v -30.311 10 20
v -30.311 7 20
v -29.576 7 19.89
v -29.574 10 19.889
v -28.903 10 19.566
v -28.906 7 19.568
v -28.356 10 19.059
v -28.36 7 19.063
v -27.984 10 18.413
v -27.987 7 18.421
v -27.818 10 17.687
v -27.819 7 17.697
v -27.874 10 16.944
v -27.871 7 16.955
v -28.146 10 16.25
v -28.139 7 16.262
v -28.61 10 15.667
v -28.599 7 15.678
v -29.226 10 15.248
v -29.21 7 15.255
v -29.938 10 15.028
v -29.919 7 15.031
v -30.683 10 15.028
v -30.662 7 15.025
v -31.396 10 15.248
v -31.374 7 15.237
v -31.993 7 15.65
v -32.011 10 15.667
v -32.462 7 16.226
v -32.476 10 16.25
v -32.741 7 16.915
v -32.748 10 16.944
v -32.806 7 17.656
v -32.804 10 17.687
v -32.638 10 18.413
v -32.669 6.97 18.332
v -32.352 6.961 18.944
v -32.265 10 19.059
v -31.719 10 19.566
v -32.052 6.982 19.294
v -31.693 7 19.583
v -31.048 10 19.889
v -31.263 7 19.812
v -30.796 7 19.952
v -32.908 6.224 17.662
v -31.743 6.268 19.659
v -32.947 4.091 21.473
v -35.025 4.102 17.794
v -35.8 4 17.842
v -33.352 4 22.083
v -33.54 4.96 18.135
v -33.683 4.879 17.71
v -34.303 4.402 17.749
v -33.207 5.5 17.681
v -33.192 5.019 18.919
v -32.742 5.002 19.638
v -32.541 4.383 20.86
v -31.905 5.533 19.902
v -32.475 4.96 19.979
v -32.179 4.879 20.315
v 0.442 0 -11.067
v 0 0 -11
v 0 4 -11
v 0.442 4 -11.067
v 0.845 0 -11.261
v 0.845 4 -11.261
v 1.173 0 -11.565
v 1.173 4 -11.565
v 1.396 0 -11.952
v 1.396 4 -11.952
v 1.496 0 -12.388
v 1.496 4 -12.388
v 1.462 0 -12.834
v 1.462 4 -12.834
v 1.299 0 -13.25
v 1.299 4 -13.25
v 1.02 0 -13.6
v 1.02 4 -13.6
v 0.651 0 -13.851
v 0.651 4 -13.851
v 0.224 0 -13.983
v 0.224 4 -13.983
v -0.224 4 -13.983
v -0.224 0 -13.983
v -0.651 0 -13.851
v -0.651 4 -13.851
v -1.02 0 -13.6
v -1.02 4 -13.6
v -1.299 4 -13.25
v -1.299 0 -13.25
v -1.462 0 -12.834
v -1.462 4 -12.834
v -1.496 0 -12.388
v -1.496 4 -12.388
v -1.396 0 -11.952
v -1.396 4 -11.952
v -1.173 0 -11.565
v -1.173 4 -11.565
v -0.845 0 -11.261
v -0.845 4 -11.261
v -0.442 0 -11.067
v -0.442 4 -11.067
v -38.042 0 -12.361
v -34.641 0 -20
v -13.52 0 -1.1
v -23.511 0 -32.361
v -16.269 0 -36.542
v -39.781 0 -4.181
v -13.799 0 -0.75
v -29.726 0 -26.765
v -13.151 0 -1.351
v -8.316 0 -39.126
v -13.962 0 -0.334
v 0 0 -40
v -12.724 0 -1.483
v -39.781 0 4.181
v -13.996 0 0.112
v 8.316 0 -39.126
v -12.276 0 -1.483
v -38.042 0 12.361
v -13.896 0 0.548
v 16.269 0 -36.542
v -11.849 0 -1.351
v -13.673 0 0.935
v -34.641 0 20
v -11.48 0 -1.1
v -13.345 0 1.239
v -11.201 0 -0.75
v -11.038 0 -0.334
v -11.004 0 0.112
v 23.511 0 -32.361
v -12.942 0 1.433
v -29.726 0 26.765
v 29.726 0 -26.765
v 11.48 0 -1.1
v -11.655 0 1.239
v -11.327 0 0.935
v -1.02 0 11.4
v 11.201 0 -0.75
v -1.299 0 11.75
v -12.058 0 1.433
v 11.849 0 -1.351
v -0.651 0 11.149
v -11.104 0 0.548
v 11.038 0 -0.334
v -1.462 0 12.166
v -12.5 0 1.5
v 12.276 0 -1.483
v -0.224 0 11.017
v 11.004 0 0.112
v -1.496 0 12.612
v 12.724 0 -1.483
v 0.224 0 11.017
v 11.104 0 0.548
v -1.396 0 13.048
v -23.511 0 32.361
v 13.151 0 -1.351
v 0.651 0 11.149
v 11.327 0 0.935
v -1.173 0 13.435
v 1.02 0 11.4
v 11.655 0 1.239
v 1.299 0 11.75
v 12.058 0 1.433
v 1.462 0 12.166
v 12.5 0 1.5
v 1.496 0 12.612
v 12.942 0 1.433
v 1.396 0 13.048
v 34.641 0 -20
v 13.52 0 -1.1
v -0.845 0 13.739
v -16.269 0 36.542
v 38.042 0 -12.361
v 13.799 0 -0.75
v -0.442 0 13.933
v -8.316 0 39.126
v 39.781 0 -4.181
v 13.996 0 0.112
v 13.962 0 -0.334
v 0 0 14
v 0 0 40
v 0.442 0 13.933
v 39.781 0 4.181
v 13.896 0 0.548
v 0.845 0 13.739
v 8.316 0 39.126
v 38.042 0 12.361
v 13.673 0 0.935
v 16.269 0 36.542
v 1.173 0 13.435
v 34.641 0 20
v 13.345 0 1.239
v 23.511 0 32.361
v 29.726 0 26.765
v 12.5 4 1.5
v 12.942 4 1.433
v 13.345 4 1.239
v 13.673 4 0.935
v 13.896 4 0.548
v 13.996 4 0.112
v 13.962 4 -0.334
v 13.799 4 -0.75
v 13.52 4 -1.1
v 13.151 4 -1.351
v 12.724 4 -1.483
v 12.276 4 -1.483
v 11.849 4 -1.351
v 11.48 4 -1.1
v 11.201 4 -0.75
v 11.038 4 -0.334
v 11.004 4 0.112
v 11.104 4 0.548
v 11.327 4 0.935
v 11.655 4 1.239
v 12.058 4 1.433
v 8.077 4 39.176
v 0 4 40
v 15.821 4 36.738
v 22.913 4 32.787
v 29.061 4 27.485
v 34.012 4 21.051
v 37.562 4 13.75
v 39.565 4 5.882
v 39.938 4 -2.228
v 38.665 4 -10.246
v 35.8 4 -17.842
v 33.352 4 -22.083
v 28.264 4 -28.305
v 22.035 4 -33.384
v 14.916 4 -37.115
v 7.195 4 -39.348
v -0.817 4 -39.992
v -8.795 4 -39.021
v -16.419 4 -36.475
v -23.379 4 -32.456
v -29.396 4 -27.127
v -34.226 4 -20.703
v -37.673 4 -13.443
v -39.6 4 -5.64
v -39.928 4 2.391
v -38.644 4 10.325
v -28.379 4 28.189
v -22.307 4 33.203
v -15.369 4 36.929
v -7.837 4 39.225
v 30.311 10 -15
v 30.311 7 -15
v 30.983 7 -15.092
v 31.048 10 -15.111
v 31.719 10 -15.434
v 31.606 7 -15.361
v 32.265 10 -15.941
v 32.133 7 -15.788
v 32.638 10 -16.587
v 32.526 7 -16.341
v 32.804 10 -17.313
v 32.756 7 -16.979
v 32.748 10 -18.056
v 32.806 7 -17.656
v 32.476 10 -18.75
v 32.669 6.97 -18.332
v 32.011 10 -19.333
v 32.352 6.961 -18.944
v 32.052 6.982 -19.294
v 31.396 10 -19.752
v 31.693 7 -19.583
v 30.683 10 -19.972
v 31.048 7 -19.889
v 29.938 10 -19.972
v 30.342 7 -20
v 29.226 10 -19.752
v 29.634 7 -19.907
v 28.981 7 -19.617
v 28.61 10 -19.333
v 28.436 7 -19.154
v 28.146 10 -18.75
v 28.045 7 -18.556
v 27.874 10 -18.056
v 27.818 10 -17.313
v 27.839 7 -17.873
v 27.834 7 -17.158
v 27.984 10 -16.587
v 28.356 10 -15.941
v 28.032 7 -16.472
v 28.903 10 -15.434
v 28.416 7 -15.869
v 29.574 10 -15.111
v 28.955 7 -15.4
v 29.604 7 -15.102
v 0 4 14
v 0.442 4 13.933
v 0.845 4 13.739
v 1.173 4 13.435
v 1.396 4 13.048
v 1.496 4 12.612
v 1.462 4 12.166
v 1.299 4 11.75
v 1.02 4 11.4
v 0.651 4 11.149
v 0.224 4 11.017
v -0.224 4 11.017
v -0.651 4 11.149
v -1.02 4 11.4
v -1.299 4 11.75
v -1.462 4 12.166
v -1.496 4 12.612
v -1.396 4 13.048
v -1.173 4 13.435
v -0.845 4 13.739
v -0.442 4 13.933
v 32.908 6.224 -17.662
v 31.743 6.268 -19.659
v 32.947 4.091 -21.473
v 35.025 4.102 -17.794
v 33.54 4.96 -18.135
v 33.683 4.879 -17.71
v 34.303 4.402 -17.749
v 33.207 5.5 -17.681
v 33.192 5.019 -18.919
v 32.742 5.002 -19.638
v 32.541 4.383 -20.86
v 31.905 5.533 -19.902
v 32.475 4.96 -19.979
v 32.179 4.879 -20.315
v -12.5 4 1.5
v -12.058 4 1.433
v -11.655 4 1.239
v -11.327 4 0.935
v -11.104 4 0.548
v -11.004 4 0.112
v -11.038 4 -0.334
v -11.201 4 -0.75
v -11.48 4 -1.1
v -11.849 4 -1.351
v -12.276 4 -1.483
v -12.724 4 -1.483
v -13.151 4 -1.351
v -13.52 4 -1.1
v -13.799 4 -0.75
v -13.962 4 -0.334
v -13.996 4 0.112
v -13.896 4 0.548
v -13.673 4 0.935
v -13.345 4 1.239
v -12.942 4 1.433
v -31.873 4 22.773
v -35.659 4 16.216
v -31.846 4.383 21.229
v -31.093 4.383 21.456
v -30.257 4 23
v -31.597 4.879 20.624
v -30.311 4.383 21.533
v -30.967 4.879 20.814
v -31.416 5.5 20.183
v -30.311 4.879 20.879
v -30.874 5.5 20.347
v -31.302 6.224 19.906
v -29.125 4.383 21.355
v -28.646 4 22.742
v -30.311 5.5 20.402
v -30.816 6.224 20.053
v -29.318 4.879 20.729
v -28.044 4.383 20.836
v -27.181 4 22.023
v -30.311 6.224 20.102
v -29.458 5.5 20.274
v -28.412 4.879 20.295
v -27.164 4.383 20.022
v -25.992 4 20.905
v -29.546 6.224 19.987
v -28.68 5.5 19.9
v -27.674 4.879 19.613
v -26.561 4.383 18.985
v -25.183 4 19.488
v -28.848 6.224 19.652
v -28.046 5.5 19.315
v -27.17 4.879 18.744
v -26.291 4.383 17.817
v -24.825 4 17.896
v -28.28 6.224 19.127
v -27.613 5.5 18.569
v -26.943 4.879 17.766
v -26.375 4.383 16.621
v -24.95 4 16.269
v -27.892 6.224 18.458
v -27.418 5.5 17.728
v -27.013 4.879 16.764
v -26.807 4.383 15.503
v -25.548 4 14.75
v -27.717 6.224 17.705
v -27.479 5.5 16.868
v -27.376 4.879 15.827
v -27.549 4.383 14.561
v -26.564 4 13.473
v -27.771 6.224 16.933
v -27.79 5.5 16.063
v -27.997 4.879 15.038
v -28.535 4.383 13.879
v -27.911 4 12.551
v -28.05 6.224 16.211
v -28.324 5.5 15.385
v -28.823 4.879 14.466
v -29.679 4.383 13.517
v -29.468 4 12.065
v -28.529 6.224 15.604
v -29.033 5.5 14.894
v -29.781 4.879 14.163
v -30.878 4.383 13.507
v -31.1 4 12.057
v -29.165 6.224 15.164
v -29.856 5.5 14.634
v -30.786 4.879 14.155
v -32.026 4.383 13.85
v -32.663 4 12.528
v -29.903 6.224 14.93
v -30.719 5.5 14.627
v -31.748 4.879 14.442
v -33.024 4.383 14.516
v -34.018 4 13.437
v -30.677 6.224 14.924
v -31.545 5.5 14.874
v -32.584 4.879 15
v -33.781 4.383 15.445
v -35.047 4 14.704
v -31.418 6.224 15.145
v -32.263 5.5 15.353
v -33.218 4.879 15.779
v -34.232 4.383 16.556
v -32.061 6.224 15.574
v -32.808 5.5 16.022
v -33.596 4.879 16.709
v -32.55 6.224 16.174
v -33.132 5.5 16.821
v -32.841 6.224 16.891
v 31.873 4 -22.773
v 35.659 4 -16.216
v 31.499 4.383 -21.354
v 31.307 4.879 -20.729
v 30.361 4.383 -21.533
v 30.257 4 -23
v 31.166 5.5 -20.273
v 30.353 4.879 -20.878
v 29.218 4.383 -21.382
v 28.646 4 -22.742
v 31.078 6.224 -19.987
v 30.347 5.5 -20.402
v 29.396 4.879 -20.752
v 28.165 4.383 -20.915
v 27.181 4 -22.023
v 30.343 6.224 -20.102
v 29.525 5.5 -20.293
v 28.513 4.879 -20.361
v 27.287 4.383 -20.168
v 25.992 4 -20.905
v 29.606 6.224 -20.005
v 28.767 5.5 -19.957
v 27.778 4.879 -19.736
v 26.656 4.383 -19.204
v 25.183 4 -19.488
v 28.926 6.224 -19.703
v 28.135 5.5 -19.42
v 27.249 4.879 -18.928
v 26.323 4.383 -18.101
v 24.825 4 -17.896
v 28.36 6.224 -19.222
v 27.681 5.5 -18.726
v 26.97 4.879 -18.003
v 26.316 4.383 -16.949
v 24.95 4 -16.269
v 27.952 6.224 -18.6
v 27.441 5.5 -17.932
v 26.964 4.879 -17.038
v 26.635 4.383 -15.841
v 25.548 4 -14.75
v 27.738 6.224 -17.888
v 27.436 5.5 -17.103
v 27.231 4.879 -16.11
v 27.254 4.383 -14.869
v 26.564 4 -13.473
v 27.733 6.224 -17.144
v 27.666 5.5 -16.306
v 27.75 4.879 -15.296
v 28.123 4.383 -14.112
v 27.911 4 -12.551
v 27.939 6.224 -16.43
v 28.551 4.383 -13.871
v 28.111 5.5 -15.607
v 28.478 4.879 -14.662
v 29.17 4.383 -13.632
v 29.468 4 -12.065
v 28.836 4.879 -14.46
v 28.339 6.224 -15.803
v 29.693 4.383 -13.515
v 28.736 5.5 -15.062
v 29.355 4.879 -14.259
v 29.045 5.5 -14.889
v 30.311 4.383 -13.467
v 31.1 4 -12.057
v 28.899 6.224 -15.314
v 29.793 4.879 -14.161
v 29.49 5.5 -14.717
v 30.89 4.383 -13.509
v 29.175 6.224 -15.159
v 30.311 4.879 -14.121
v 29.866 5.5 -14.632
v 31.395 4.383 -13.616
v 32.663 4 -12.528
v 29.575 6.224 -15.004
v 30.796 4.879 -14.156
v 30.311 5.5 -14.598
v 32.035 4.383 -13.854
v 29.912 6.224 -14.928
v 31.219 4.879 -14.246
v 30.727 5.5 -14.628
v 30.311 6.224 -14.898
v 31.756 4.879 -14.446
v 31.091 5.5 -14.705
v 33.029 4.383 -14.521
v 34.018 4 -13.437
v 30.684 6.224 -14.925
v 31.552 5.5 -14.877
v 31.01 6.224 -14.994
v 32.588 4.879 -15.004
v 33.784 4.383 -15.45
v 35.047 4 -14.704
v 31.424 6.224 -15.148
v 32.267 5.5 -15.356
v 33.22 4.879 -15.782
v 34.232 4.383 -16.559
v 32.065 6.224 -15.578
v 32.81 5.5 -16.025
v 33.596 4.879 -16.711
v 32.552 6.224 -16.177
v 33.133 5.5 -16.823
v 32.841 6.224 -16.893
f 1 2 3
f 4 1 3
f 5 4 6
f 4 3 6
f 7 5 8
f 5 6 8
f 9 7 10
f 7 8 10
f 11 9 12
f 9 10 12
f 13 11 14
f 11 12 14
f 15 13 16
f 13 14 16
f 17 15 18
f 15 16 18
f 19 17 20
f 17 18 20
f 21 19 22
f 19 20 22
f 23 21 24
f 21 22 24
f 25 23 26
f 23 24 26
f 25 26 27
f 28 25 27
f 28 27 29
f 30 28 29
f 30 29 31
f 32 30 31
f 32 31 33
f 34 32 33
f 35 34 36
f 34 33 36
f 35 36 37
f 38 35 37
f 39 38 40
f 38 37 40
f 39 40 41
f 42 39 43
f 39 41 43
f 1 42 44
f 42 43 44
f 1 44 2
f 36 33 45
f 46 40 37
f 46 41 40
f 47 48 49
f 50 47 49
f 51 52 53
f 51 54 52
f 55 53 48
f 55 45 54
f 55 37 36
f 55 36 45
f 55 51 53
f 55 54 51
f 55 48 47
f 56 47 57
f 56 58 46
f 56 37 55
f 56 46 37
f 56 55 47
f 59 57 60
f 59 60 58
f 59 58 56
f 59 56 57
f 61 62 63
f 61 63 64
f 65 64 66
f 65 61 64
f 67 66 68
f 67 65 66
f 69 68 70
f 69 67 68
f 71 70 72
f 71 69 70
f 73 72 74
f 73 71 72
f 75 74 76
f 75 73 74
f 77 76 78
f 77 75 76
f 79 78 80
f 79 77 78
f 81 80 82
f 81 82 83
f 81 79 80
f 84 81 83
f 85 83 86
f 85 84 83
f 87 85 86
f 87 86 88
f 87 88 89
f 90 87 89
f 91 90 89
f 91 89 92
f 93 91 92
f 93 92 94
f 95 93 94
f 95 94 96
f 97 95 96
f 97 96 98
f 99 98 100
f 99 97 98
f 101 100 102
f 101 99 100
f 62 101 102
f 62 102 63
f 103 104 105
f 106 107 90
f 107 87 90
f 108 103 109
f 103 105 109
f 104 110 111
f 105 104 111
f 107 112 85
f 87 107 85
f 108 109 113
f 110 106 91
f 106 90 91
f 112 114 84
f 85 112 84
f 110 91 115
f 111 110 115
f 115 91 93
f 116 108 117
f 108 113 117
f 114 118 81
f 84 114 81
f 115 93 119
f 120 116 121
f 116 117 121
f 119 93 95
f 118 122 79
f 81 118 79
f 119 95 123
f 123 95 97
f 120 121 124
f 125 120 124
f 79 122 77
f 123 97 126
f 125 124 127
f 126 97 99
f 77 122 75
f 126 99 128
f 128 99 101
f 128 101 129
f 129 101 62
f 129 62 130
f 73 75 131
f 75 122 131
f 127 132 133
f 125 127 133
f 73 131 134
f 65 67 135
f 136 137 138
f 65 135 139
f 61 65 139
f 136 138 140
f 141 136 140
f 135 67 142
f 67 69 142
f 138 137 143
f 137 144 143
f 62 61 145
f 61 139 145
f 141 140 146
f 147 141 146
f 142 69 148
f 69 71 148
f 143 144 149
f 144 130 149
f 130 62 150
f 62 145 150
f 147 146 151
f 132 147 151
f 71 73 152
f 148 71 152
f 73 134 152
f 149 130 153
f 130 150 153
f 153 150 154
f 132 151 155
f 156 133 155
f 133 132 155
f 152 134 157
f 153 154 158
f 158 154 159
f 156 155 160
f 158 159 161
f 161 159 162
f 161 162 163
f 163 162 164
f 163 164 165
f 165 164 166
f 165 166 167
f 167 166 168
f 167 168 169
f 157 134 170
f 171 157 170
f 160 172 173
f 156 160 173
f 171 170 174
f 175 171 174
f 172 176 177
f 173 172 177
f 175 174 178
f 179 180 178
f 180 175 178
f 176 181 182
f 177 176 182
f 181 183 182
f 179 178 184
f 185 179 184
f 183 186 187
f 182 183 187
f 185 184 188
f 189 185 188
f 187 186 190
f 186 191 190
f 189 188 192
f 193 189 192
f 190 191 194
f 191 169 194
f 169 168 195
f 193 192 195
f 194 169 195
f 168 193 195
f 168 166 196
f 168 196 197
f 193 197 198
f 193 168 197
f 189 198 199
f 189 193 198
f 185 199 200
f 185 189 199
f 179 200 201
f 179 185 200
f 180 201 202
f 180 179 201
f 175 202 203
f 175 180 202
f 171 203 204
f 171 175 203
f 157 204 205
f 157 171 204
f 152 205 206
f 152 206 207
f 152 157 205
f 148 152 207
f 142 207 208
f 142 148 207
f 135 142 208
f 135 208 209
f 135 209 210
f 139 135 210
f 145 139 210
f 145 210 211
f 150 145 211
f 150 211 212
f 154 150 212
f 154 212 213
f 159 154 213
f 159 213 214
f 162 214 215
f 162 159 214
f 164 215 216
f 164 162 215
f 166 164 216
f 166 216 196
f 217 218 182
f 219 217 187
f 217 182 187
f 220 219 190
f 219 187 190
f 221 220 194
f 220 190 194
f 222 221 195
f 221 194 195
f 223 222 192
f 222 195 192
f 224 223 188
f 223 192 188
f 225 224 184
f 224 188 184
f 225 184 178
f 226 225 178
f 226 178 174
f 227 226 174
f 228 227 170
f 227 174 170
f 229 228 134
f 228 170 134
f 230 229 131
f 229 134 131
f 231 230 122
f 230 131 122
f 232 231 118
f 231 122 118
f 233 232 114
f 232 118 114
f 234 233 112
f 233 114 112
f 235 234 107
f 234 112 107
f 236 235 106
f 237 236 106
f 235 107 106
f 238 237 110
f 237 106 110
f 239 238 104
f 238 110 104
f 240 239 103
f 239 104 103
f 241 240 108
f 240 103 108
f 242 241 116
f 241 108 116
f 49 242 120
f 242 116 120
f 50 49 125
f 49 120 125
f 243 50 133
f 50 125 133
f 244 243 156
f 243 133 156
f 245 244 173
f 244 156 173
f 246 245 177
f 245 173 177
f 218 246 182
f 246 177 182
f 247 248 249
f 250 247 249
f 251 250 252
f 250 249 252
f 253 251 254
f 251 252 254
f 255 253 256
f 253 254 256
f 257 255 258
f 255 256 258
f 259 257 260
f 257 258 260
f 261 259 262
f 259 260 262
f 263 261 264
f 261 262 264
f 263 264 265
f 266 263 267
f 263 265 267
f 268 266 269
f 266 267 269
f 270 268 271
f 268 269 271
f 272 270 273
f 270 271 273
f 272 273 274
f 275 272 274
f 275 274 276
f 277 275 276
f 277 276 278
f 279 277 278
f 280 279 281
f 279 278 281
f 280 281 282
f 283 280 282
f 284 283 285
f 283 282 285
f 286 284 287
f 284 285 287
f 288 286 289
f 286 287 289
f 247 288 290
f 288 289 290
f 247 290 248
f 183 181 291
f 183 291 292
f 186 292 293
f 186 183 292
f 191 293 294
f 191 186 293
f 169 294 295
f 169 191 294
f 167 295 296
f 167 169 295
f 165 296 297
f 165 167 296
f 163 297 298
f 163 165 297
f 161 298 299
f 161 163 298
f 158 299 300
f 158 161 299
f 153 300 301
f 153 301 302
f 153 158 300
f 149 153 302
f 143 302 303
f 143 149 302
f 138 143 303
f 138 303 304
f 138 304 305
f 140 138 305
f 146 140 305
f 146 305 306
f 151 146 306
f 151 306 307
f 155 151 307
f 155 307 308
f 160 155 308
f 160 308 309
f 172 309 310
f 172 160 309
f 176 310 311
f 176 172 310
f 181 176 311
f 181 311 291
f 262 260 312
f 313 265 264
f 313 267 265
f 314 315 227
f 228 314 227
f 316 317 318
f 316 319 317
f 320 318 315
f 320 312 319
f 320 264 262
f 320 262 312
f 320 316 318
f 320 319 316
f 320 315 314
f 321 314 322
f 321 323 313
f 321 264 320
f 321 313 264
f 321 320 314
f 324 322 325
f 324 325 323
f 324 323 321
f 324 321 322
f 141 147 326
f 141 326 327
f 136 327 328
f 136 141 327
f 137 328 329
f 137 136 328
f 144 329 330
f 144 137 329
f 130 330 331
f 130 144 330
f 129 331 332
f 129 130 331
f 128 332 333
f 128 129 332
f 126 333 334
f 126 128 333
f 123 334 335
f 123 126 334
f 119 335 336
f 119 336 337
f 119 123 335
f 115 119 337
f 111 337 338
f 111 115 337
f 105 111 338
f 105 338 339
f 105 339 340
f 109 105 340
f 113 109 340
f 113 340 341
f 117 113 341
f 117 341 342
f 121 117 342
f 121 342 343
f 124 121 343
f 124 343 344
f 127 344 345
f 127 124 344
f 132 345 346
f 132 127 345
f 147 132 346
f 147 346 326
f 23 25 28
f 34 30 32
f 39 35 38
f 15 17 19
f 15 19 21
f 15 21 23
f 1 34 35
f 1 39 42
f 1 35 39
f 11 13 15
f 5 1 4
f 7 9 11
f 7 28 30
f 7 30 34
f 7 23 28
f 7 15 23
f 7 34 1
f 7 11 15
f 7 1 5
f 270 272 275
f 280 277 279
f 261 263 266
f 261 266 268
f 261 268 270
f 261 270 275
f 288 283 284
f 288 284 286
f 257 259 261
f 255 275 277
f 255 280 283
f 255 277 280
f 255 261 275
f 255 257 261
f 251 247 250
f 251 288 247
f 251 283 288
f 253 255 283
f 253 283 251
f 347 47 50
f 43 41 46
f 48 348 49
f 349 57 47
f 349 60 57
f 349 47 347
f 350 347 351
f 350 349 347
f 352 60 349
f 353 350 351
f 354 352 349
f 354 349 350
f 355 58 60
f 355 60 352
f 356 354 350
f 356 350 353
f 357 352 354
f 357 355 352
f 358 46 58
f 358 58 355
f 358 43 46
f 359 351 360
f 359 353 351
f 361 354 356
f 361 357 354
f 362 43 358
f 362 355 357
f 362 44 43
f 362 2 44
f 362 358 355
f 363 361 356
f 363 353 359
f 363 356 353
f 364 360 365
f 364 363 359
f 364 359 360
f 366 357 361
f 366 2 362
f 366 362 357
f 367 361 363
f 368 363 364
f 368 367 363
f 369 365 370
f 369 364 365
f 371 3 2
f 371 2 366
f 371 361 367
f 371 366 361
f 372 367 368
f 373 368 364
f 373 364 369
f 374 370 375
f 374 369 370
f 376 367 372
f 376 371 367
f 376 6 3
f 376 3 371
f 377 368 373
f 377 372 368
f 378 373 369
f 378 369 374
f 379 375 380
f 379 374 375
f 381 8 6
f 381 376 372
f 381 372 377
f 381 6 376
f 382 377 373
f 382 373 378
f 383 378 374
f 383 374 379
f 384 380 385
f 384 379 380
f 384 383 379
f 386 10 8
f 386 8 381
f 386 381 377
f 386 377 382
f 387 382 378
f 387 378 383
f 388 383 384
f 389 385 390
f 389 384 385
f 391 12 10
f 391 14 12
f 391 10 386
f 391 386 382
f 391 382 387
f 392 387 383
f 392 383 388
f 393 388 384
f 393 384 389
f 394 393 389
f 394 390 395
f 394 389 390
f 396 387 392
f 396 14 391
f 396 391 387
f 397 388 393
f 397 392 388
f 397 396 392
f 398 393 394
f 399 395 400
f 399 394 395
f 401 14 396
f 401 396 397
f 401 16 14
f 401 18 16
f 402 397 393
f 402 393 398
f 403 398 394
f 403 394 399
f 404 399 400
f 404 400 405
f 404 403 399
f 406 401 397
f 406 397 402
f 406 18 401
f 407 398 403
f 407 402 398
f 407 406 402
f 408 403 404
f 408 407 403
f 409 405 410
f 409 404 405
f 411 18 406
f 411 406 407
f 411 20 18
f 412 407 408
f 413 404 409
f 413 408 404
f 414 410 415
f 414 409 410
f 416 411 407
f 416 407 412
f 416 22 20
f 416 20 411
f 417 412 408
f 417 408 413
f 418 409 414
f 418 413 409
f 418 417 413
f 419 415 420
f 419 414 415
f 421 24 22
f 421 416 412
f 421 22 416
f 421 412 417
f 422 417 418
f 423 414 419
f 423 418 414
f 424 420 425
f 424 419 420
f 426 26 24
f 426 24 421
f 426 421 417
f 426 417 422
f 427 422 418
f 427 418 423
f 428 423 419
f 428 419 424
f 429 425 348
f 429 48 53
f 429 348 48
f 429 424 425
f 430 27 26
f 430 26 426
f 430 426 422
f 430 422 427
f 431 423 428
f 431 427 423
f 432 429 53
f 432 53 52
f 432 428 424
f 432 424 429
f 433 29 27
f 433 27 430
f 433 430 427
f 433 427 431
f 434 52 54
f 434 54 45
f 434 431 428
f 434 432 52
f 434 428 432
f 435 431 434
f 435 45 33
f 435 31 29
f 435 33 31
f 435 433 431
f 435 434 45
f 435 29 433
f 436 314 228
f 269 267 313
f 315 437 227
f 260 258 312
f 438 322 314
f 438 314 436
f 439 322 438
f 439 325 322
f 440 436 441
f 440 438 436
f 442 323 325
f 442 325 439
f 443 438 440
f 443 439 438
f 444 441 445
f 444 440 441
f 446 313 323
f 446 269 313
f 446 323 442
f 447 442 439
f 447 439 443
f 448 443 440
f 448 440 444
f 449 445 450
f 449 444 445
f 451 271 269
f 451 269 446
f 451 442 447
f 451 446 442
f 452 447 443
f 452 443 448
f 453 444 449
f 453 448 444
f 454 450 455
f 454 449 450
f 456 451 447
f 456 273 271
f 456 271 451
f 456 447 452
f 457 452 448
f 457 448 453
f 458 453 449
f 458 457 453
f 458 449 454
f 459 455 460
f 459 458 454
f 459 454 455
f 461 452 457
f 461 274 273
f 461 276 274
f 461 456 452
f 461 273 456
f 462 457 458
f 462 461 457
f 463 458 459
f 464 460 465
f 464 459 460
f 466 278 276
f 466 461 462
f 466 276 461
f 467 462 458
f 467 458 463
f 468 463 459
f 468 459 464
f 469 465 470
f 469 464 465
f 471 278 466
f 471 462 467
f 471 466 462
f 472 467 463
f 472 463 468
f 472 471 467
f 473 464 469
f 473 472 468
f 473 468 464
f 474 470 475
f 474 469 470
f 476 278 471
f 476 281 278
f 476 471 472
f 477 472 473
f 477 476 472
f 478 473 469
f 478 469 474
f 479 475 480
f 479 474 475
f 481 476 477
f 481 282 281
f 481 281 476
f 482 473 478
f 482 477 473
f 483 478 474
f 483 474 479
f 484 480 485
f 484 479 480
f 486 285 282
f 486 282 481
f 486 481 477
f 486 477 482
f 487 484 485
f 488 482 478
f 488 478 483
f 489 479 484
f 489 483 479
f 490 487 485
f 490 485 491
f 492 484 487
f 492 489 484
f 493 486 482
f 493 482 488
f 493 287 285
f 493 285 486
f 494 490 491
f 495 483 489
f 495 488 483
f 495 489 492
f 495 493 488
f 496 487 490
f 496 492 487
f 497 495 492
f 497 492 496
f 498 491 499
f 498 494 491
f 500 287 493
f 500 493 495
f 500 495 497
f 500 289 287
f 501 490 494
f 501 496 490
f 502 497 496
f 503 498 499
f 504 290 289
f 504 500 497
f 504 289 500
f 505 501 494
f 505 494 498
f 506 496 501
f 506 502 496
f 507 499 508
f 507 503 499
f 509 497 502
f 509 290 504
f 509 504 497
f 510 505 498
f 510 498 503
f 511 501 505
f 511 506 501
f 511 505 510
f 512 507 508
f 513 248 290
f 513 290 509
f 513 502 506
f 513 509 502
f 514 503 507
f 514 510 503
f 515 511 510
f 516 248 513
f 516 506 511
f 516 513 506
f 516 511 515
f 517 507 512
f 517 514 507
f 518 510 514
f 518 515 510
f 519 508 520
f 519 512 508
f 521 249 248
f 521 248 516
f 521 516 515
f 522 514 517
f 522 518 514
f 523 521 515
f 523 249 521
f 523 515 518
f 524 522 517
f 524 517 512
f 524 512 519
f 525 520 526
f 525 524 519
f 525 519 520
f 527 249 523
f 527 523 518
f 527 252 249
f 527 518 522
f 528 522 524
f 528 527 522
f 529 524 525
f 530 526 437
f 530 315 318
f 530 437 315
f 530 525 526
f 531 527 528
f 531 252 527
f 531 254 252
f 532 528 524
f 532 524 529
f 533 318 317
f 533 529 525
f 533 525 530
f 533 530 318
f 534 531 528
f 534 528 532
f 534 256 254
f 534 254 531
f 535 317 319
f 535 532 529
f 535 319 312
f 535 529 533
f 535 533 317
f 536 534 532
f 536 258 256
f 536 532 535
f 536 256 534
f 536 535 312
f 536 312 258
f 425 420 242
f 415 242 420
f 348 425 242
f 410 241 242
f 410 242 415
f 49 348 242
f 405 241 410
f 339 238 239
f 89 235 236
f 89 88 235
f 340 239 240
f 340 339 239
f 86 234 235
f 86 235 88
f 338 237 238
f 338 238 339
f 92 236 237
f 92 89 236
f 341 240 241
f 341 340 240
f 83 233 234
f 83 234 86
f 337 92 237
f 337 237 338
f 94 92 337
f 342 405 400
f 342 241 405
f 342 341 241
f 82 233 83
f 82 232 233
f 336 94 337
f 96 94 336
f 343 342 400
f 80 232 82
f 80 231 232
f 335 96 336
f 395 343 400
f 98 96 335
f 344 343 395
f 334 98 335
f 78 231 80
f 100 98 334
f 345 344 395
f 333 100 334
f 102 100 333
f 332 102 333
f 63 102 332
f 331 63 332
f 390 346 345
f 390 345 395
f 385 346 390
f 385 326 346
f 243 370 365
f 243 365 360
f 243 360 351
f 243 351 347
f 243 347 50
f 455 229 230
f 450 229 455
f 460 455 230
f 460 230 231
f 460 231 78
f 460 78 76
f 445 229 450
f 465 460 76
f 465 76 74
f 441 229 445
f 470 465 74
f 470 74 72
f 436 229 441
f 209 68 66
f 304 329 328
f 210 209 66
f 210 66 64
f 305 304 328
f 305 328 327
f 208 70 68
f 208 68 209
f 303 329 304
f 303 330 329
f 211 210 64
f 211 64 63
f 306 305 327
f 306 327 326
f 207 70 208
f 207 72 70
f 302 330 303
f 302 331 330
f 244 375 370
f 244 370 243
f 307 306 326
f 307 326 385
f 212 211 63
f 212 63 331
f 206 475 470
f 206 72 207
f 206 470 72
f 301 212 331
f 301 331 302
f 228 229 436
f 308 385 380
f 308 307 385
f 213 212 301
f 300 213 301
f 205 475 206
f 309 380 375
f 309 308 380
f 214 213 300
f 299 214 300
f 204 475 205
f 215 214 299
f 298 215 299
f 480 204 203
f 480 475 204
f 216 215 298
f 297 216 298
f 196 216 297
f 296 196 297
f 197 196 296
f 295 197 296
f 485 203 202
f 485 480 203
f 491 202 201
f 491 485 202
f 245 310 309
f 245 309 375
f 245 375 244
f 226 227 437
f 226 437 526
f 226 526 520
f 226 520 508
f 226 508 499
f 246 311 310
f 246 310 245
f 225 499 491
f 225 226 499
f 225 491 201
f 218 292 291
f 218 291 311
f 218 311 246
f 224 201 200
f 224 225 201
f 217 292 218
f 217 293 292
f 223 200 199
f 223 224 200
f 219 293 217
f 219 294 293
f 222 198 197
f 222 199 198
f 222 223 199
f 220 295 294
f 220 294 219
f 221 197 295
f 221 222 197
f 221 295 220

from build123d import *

# Parameters (mm, degrees)
SKETCH1_R           = 40
SKETCH1_R_2         = 1.5
BOSS_EXTRUDE1_DEPTH = 4
SKETCH2_R           = 2.5
BOSS_EXTRUDE2_DEPTH = 6
FILLET1_R           = 3


with BuildPart() as part:
    # Sketch1 → Boss-Extrude1 (new body)
    with BuildSketch(Plane(origin=(0, 0, 0), x_dir=(1, 0, 0), z_dir=(0, 1, 0))):
        with Locations(Location((0, 0, 0), (0, 0, 270))):
            Circle(SKETCH1_R)
        with Locations(Location((0, -12.5, 0), (0, 0, 270))):
            Circle(SKETCH1_R_2, mode=Mode.SUBTRACT)
        with Locations(Location((-12.5, 0, 0), (0, 0, 270))):
            Circle(SKETCH1_R_2, mode=Mode.SUBTRACT)
        with Locations(Location((0, 12.5, 0), (0, 0, 270))):
            Circle(SKETCH1_R_2, mode=Mode.SUBTRACT)
        with Locations(Location((12.5, 0, 0), (0, 0, 270))):
            Circle(SKETCH1_R_2, mode=Mode.SUBTRACT)
    extrude(amount=BOSS_EXTRUDE1_DEPTH)

    # Sketch2 → Boss-Extrude2 (add)
    with BuildSketch(Plane(origin=(0, 4, 0), x_dir=(1, 0, 0), z_dir=(0, 1, 0))):
        with Locations(Location((30.310889132, 17.5, 0), (0, 0, 270))):
            Circle(SKETCH2_R)
        with Locations(Location((-30.310889132, -17.5, 0), (0, 0, 270))):
            Circle(SKETCH2_R)
    extrude(amount=BOSS_EXTRUDE2_DEPTH)

    # Fillet1
    fillet1_edges = [part.edges().sort_by_distance(p)[0] for p in [
        (30.310889132, 4, -20),
        (-30.310889132, 4, 15),
    ]]
    fillet(fillet1_edges, radius=FILLET1_R)


solid = part.part
